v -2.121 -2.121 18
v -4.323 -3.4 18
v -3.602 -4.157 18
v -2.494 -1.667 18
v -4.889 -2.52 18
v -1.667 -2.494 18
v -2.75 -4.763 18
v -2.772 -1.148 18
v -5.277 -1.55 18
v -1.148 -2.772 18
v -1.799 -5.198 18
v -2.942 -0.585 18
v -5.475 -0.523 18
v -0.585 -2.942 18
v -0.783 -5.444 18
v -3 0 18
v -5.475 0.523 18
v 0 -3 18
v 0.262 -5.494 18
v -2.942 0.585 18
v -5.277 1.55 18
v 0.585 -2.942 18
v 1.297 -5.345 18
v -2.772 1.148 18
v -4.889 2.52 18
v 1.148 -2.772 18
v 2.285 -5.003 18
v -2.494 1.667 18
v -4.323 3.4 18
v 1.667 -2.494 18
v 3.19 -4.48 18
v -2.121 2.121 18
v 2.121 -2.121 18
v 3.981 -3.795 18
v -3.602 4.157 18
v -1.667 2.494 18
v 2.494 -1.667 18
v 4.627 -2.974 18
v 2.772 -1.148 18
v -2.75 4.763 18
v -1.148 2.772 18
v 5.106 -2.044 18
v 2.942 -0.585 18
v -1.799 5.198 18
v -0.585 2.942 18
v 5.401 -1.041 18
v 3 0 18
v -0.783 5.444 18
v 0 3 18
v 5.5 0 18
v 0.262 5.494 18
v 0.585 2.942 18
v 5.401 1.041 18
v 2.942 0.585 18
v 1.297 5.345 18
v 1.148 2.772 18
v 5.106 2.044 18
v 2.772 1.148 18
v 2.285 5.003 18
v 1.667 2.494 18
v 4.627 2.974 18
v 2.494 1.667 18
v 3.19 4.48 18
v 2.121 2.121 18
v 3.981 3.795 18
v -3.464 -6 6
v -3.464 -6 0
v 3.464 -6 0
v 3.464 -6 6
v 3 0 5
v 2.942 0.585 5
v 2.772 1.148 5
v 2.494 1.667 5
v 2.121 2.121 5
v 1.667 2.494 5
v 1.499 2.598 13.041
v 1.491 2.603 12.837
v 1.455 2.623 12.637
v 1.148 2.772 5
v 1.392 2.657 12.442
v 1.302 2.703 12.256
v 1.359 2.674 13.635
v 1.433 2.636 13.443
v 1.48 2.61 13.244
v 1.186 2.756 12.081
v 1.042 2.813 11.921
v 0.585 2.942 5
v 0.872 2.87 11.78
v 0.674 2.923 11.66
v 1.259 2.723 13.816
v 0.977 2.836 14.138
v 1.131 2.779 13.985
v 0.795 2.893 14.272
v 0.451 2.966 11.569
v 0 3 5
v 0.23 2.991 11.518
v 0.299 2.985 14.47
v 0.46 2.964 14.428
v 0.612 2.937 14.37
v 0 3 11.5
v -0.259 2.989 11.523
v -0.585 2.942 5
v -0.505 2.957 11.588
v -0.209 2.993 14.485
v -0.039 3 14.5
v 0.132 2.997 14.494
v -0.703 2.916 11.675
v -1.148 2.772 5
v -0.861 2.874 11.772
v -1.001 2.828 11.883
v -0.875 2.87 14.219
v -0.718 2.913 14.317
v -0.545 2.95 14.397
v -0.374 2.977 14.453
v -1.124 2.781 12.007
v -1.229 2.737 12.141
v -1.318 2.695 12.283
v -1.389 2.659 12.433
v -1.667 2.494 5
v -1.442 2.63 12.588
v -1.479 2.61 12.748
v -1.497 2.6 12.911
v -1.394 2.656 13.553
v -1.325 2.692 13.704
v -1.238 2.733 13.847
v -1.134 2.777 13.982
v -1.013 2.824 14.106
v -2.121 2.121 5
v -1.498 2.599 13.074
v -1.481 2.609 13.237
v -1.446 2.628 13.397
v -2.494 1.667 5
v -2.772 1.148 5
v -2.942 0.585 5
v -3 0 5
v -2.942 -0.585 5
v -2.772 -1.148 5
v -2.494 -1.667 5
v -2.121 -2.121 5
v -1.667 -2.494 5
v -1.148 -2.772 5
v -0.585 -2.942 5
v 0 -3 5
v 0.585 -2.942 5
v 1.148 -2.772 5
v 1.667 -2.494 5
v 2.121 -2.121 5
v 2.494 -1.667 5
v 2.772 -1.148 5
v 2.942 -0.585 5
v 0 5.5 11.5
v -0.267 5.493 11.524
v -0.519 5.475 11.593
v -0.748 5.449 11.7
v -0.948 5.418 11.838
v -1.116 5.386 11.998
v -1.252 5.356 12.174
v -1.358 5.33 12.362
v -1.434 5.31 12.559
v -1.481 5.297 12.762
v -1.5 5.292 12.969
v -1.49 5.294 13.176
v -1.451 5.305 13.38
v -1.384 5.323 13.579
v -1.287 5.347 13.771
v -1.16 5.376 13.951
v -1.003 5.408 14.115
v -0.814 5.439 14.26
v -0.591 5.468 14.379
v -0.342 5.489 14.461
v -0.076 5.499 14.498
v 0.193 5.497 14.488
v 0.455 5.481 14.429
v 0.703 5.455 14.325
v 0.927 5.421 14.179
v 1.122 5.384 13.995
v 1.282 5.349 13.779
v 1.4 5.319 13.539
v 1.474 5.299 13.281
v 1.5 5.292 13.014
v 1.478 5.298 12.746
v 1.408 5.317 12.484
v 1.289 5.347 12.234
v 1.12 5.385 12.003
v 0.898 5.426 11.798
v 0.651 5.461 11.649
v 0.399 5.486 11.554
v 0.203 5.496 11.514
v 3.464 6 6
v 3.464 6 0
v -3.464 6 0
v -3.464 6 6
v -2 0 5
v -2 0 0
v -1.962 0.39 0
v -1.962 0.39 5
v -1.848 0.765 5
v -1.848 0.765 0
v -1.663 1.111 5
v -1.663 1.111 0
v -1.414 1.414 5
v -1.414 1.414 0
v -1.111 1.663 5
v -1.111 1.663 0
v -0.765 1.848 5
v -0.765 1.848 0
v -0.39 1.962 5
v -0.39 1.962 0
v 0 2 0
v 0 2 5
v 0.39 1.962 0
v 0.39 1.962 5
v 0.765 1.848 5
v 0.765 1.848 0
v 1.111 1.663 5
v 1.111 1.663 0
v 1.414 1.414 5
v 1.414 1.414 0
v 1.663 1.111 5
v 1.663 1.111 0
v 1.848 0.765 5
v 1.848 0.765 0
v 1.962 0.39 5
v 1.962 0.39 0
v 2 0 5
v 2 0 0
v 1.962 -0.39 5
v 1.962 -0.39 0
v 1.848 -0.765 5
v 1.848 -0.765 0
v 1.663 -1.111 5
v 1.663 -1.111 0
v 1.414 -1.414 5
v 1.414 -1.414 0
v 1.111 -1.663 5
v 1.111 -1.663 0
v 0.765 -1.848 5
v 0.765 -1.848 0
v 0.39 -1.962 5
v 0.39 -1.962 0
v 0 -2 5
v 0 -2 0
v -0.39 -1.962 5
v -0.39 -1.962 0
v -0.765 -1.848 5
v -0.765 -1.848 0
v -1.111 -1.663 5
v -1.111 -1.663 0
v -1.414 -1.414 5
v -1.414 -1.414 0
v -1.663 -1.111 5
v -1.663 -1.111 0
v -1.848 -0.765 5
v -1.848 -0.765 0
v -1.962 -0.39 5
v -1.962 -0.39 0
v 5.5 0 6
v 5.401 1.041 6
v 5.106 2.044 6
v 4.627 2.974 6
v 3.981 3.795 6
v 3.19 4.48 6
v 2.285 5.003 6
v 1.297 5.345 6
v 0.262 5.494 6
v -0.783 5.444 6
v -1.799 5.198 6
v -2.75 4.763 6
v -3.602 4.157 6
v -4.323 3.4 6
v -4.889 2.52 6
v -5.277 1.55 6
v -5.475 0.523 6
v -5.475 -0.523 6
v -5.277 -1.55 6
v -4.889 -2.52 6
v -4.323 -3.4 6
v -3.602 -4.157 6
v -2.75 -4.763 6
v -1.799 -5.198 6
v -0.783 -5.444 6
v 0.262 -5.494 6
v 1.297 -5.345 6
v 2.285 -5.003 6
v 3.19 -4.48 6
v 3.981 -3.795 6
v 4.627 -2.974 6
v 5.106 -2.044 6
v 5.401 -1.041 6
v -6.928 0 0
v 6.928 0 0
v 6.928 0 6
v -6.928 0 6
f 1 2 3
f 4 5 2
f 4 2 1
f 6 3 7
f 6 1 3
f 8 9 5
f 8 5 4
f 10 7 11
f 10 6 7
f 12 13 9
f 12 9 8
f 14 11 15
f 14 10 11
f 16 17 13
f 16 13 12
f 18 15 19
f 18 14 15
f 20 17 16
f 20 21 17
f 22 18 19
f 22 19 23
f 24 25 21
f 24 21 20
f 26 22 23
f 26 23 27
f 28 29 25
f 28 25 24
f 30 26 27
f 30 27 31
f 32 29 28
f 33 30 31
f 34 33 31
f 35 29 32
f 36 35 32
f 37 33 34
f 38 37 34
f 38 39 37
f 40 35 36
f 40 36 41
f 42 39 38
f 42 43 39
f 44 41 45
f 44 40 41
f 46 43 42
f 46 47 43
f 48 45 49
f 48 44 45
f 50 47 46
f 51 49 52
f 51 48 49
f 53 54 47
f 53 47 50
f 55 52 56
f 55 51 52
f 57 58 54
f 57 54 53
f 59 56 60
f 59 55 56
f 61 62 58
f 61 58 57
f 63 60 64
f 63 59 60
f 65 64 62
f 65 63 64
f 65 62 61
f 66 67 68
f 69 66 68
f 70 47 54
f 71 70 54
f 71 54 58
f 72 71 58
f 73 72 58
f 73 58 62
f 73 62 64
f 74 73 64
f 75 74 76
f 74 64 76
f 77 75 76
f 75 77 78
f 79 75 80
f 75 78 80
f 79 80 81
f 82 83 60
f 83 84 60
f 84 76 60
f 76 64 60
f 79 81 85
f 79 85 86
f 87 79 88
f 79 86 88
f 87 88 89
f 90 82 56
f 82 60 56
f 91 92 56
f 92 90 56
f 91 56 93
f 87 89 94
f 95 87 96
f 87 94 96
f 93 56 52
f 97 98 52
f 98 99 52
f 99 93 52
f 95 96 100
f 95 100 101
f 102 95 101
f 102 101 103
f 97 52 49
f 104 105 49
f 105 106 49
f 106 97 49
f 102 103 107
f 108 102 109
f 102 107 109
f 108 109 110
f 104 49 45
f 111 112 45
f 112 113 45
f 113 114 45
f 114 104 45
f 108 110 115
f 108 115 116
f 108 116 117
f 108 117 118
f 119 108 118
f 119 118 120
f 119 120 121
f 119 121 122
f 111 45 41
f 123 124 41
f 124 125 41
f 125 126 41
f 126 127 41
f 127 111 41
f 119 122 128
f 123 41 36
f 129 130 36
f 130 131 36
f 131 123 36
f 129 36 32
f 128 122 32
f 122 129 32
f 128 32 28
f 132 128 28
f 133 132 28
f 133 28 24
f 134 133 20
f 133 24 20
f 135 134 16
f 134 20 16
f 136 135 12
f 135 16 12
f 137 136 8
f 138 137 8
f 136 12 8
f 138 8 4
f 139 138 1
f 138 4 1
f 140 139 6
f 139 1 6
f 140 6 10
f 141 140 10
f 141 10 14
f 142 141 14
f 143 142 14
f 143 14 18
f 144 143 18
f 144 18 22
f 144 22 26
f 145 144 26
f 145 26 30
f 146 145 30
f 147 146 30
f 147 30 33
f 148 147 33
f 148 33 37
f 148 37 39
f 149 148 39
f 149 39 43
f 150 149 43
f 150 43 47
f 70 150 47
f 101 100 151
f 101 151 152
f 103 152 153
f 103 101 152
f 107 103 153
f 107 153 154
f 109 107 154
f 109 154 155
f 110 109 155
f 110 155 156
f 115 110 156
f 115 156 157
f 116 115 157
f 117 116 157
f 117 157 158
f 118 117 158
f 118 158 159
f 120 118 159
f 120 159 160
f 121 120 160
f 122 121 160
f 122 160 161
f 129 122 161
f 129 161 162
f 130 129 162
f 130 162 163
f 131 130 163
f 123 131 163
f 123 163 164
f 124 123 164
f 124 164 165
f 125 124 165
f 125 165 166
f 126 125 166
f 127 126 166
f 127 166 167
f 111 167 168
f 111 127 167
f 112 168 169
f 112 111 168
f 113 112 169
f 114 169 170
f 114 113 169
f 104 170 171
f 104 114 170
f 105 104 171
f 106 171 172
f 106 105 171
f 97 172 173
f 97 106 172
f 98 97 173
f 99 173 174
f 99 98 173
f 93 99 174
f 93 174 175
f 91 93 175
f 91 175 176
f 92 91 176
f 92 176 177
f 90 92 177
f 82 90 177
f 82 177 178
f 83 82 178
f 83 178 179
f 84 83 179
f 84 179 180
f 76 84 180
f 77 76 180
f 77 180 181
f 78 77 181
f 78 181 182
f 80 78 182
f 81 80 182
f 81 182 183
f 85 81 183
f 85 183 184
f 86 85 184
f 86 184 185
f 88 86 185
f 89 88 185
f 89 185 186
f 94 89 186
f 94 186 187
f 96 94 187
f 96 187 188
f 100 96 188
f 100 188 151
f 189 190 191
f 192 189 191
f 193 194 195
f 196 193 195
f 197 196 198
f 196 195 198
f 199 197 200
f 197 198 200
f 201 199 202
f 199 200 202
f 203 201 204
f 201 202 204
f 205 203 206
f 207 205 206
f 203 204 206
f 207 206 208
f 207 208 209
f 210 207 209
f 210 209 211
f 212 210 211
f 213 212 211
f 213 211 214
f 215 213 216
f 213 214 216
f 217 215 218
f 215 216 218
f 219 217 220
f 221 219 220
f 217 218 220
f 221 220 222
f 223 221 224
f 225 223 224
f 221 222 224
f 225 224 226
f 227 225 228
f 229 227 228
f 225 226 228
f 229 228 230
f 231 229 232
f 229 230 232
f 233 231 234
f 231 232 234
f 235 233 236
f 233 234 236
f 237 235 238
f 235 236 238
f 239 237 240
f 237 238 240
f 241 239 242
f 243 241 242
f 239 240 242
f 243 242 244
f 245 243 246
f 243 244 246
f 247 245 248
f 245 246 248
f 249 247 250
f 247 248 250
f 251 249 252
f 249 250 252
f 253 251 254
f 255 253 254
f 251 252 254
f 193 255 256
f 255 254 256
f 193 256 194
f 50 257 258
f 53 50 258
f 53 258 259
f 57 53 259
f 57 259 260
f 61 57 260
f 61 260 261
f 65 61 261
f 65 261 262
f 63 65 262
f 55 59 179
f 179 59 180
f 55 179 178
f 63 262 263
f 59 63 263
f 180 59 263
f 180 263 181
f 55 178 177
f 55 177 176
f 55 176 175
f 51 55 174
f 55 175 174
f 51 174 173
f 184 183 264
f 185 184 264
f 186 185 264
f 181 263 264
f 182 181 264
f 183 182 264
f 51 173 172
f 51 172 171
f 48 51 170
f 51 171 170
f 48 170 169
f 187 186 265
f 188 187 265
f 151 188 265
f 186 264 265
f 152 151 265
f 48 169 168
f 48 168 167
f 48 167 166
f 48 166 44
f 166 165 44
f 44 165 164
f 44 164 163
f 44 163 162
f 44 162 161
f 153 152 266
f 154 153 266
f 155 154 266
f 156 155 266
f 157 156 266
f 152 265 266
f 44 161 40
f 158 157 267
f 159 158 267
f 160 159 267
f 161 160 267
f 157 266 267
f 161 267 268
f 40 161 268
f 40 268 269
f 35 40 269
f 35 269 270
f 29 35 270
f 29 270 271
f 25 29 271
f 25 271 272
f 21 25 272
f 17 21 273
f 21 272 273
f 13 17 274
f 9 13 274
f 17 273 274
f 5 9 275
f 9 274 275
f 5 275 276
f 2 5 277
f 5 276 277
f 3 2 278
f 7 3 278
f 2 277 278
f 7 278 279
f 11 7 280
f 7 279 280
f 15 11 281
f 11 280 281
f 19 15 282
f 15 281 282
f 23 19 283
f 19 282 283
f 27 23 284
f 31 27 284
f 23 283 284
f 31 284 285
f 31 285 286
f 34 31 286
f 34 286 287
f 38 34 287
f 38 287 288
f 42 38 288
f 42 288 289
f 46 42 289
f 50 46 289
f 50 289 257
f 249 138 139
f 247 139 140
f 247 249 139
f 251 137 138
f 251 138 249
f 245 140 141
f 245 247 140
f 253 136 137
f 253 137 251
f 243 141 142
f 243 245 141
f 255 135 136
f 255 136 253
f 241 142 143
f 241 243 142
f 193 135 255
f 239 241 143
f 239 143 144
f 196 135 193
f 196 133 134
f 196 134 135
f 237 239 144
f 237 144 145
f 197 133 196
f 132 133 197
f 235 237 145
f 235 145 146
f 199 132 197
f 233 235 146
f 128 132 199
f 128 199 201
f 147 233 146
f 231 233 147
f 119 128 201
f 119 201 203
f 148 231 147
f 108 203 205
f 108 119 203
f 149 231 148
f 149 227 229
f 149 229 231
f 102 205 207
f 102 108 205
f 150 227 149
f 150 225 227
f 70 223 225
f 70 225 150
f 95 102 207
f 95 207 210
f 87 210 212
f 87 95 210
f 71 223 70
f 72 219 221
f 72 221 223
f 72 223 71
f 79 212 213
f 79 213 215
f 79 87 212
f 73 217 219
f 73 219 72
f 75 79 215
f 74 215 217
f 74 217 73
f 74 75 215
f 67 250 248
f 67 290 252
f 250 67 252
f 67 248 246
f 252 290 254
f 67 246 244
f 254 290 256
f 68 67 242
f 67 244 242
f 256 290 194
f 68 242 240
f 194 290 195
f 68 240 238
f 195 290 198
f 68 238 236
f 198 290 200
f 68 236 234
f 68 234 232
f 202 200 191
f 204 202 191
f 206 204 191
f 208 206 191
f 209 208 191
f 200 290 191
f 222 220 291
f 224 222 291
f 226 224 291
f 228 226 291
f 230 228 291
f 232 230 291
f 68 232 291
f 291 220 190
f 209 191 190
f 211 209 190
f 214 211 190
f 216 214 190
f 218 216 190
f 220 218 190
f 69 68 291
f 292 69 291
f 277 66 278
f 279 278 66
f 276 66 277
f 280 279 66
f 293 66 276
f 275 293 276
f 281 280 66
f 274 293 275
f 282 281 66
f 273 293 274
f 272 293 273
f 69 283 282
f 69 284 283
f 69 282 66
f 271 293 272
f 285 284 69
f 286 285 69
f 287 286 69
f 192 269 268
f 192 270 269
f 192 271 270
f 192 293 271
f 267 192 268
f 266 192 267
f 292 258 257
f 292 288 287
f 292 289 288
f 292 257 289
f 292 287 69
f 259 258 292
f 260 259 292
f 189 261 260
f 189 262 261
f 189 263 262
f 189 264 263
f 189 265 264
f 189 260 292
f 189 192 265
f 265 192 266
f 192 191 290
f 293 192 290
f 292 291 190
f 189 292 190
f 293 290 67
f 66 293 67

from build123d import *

# Parameters (mm, degrees)
EXTRUDE_1_DEPTH     = 6
SKETCH_2_R          = 5.5
EXTRUDE_2_DEPTH     = 12
SKETCH_3_R          = 3
CUT_EXTRUDE_1_DEPTH = 13
SKETCH_4_R          = 2
CUT_EXTRUDE_2_DEPTH = 5
SKETCH_5_R          = 1.5
CUT_EXTRUDE_3_DEPTH = 12


with BuildPart() as part:
    # 草图1 → 凸台-拉伸1 (new body)
    with BuildSketch(Plane.XY):
        Polygon((6.92820323, 0), (3.464101615, 6), (-3.464101615, 6), (-6.92820323, 0), (-3.464101615, -6), (3.464101615, -6), align=None)
    extrude(amount=EXTRUDE_1_DEPTH)

    # 草图2 → 凸台-拉伸2 (add)
    with BuildSketch(Plane.XY.offset(6)):
        Circle(SKETCH_2_R)
    extrude(amount=EXTRUDE_2_DEPTH)

    # 草图3 → 切除-拉伸1 (cut)
    with BuildSketch(Plane.XY.offset(18)):
        Circle(SKETCH_3_R)
    extrude(amount=-CUT_EXTRUDE_1_DEPTH, mode=Mode.SUBTRACT)

    # 草图4 → 切除-拉伸2 (cut)
    with BuildSketch(Plane(origin=(0, 0, 0), x_dir=(-1, 0, 0), z_dir=(0, 0, -1))):
        Circle(SKETCH_4_R)
    extrude(amount=-CUT_EXTRUDE_2_DEPTH, mode=Mode.SUBTRACT)

    # 草图5 → 切除-拉伸3 (cut)
    with BuildSketch(Plane(origin=(0, 0, 0), x_dir=(1, 0, 0), z_dir=(0, 1, 0))):
        with Locations(Location((0, -13, 0), (0, 0, 90))):
            Circle(SKETCH_5_R)
    extrude(amount=CUT_EXTRUDE_3_DEPTH, mode=Mode.SUBTRACT)


solid = part.part
